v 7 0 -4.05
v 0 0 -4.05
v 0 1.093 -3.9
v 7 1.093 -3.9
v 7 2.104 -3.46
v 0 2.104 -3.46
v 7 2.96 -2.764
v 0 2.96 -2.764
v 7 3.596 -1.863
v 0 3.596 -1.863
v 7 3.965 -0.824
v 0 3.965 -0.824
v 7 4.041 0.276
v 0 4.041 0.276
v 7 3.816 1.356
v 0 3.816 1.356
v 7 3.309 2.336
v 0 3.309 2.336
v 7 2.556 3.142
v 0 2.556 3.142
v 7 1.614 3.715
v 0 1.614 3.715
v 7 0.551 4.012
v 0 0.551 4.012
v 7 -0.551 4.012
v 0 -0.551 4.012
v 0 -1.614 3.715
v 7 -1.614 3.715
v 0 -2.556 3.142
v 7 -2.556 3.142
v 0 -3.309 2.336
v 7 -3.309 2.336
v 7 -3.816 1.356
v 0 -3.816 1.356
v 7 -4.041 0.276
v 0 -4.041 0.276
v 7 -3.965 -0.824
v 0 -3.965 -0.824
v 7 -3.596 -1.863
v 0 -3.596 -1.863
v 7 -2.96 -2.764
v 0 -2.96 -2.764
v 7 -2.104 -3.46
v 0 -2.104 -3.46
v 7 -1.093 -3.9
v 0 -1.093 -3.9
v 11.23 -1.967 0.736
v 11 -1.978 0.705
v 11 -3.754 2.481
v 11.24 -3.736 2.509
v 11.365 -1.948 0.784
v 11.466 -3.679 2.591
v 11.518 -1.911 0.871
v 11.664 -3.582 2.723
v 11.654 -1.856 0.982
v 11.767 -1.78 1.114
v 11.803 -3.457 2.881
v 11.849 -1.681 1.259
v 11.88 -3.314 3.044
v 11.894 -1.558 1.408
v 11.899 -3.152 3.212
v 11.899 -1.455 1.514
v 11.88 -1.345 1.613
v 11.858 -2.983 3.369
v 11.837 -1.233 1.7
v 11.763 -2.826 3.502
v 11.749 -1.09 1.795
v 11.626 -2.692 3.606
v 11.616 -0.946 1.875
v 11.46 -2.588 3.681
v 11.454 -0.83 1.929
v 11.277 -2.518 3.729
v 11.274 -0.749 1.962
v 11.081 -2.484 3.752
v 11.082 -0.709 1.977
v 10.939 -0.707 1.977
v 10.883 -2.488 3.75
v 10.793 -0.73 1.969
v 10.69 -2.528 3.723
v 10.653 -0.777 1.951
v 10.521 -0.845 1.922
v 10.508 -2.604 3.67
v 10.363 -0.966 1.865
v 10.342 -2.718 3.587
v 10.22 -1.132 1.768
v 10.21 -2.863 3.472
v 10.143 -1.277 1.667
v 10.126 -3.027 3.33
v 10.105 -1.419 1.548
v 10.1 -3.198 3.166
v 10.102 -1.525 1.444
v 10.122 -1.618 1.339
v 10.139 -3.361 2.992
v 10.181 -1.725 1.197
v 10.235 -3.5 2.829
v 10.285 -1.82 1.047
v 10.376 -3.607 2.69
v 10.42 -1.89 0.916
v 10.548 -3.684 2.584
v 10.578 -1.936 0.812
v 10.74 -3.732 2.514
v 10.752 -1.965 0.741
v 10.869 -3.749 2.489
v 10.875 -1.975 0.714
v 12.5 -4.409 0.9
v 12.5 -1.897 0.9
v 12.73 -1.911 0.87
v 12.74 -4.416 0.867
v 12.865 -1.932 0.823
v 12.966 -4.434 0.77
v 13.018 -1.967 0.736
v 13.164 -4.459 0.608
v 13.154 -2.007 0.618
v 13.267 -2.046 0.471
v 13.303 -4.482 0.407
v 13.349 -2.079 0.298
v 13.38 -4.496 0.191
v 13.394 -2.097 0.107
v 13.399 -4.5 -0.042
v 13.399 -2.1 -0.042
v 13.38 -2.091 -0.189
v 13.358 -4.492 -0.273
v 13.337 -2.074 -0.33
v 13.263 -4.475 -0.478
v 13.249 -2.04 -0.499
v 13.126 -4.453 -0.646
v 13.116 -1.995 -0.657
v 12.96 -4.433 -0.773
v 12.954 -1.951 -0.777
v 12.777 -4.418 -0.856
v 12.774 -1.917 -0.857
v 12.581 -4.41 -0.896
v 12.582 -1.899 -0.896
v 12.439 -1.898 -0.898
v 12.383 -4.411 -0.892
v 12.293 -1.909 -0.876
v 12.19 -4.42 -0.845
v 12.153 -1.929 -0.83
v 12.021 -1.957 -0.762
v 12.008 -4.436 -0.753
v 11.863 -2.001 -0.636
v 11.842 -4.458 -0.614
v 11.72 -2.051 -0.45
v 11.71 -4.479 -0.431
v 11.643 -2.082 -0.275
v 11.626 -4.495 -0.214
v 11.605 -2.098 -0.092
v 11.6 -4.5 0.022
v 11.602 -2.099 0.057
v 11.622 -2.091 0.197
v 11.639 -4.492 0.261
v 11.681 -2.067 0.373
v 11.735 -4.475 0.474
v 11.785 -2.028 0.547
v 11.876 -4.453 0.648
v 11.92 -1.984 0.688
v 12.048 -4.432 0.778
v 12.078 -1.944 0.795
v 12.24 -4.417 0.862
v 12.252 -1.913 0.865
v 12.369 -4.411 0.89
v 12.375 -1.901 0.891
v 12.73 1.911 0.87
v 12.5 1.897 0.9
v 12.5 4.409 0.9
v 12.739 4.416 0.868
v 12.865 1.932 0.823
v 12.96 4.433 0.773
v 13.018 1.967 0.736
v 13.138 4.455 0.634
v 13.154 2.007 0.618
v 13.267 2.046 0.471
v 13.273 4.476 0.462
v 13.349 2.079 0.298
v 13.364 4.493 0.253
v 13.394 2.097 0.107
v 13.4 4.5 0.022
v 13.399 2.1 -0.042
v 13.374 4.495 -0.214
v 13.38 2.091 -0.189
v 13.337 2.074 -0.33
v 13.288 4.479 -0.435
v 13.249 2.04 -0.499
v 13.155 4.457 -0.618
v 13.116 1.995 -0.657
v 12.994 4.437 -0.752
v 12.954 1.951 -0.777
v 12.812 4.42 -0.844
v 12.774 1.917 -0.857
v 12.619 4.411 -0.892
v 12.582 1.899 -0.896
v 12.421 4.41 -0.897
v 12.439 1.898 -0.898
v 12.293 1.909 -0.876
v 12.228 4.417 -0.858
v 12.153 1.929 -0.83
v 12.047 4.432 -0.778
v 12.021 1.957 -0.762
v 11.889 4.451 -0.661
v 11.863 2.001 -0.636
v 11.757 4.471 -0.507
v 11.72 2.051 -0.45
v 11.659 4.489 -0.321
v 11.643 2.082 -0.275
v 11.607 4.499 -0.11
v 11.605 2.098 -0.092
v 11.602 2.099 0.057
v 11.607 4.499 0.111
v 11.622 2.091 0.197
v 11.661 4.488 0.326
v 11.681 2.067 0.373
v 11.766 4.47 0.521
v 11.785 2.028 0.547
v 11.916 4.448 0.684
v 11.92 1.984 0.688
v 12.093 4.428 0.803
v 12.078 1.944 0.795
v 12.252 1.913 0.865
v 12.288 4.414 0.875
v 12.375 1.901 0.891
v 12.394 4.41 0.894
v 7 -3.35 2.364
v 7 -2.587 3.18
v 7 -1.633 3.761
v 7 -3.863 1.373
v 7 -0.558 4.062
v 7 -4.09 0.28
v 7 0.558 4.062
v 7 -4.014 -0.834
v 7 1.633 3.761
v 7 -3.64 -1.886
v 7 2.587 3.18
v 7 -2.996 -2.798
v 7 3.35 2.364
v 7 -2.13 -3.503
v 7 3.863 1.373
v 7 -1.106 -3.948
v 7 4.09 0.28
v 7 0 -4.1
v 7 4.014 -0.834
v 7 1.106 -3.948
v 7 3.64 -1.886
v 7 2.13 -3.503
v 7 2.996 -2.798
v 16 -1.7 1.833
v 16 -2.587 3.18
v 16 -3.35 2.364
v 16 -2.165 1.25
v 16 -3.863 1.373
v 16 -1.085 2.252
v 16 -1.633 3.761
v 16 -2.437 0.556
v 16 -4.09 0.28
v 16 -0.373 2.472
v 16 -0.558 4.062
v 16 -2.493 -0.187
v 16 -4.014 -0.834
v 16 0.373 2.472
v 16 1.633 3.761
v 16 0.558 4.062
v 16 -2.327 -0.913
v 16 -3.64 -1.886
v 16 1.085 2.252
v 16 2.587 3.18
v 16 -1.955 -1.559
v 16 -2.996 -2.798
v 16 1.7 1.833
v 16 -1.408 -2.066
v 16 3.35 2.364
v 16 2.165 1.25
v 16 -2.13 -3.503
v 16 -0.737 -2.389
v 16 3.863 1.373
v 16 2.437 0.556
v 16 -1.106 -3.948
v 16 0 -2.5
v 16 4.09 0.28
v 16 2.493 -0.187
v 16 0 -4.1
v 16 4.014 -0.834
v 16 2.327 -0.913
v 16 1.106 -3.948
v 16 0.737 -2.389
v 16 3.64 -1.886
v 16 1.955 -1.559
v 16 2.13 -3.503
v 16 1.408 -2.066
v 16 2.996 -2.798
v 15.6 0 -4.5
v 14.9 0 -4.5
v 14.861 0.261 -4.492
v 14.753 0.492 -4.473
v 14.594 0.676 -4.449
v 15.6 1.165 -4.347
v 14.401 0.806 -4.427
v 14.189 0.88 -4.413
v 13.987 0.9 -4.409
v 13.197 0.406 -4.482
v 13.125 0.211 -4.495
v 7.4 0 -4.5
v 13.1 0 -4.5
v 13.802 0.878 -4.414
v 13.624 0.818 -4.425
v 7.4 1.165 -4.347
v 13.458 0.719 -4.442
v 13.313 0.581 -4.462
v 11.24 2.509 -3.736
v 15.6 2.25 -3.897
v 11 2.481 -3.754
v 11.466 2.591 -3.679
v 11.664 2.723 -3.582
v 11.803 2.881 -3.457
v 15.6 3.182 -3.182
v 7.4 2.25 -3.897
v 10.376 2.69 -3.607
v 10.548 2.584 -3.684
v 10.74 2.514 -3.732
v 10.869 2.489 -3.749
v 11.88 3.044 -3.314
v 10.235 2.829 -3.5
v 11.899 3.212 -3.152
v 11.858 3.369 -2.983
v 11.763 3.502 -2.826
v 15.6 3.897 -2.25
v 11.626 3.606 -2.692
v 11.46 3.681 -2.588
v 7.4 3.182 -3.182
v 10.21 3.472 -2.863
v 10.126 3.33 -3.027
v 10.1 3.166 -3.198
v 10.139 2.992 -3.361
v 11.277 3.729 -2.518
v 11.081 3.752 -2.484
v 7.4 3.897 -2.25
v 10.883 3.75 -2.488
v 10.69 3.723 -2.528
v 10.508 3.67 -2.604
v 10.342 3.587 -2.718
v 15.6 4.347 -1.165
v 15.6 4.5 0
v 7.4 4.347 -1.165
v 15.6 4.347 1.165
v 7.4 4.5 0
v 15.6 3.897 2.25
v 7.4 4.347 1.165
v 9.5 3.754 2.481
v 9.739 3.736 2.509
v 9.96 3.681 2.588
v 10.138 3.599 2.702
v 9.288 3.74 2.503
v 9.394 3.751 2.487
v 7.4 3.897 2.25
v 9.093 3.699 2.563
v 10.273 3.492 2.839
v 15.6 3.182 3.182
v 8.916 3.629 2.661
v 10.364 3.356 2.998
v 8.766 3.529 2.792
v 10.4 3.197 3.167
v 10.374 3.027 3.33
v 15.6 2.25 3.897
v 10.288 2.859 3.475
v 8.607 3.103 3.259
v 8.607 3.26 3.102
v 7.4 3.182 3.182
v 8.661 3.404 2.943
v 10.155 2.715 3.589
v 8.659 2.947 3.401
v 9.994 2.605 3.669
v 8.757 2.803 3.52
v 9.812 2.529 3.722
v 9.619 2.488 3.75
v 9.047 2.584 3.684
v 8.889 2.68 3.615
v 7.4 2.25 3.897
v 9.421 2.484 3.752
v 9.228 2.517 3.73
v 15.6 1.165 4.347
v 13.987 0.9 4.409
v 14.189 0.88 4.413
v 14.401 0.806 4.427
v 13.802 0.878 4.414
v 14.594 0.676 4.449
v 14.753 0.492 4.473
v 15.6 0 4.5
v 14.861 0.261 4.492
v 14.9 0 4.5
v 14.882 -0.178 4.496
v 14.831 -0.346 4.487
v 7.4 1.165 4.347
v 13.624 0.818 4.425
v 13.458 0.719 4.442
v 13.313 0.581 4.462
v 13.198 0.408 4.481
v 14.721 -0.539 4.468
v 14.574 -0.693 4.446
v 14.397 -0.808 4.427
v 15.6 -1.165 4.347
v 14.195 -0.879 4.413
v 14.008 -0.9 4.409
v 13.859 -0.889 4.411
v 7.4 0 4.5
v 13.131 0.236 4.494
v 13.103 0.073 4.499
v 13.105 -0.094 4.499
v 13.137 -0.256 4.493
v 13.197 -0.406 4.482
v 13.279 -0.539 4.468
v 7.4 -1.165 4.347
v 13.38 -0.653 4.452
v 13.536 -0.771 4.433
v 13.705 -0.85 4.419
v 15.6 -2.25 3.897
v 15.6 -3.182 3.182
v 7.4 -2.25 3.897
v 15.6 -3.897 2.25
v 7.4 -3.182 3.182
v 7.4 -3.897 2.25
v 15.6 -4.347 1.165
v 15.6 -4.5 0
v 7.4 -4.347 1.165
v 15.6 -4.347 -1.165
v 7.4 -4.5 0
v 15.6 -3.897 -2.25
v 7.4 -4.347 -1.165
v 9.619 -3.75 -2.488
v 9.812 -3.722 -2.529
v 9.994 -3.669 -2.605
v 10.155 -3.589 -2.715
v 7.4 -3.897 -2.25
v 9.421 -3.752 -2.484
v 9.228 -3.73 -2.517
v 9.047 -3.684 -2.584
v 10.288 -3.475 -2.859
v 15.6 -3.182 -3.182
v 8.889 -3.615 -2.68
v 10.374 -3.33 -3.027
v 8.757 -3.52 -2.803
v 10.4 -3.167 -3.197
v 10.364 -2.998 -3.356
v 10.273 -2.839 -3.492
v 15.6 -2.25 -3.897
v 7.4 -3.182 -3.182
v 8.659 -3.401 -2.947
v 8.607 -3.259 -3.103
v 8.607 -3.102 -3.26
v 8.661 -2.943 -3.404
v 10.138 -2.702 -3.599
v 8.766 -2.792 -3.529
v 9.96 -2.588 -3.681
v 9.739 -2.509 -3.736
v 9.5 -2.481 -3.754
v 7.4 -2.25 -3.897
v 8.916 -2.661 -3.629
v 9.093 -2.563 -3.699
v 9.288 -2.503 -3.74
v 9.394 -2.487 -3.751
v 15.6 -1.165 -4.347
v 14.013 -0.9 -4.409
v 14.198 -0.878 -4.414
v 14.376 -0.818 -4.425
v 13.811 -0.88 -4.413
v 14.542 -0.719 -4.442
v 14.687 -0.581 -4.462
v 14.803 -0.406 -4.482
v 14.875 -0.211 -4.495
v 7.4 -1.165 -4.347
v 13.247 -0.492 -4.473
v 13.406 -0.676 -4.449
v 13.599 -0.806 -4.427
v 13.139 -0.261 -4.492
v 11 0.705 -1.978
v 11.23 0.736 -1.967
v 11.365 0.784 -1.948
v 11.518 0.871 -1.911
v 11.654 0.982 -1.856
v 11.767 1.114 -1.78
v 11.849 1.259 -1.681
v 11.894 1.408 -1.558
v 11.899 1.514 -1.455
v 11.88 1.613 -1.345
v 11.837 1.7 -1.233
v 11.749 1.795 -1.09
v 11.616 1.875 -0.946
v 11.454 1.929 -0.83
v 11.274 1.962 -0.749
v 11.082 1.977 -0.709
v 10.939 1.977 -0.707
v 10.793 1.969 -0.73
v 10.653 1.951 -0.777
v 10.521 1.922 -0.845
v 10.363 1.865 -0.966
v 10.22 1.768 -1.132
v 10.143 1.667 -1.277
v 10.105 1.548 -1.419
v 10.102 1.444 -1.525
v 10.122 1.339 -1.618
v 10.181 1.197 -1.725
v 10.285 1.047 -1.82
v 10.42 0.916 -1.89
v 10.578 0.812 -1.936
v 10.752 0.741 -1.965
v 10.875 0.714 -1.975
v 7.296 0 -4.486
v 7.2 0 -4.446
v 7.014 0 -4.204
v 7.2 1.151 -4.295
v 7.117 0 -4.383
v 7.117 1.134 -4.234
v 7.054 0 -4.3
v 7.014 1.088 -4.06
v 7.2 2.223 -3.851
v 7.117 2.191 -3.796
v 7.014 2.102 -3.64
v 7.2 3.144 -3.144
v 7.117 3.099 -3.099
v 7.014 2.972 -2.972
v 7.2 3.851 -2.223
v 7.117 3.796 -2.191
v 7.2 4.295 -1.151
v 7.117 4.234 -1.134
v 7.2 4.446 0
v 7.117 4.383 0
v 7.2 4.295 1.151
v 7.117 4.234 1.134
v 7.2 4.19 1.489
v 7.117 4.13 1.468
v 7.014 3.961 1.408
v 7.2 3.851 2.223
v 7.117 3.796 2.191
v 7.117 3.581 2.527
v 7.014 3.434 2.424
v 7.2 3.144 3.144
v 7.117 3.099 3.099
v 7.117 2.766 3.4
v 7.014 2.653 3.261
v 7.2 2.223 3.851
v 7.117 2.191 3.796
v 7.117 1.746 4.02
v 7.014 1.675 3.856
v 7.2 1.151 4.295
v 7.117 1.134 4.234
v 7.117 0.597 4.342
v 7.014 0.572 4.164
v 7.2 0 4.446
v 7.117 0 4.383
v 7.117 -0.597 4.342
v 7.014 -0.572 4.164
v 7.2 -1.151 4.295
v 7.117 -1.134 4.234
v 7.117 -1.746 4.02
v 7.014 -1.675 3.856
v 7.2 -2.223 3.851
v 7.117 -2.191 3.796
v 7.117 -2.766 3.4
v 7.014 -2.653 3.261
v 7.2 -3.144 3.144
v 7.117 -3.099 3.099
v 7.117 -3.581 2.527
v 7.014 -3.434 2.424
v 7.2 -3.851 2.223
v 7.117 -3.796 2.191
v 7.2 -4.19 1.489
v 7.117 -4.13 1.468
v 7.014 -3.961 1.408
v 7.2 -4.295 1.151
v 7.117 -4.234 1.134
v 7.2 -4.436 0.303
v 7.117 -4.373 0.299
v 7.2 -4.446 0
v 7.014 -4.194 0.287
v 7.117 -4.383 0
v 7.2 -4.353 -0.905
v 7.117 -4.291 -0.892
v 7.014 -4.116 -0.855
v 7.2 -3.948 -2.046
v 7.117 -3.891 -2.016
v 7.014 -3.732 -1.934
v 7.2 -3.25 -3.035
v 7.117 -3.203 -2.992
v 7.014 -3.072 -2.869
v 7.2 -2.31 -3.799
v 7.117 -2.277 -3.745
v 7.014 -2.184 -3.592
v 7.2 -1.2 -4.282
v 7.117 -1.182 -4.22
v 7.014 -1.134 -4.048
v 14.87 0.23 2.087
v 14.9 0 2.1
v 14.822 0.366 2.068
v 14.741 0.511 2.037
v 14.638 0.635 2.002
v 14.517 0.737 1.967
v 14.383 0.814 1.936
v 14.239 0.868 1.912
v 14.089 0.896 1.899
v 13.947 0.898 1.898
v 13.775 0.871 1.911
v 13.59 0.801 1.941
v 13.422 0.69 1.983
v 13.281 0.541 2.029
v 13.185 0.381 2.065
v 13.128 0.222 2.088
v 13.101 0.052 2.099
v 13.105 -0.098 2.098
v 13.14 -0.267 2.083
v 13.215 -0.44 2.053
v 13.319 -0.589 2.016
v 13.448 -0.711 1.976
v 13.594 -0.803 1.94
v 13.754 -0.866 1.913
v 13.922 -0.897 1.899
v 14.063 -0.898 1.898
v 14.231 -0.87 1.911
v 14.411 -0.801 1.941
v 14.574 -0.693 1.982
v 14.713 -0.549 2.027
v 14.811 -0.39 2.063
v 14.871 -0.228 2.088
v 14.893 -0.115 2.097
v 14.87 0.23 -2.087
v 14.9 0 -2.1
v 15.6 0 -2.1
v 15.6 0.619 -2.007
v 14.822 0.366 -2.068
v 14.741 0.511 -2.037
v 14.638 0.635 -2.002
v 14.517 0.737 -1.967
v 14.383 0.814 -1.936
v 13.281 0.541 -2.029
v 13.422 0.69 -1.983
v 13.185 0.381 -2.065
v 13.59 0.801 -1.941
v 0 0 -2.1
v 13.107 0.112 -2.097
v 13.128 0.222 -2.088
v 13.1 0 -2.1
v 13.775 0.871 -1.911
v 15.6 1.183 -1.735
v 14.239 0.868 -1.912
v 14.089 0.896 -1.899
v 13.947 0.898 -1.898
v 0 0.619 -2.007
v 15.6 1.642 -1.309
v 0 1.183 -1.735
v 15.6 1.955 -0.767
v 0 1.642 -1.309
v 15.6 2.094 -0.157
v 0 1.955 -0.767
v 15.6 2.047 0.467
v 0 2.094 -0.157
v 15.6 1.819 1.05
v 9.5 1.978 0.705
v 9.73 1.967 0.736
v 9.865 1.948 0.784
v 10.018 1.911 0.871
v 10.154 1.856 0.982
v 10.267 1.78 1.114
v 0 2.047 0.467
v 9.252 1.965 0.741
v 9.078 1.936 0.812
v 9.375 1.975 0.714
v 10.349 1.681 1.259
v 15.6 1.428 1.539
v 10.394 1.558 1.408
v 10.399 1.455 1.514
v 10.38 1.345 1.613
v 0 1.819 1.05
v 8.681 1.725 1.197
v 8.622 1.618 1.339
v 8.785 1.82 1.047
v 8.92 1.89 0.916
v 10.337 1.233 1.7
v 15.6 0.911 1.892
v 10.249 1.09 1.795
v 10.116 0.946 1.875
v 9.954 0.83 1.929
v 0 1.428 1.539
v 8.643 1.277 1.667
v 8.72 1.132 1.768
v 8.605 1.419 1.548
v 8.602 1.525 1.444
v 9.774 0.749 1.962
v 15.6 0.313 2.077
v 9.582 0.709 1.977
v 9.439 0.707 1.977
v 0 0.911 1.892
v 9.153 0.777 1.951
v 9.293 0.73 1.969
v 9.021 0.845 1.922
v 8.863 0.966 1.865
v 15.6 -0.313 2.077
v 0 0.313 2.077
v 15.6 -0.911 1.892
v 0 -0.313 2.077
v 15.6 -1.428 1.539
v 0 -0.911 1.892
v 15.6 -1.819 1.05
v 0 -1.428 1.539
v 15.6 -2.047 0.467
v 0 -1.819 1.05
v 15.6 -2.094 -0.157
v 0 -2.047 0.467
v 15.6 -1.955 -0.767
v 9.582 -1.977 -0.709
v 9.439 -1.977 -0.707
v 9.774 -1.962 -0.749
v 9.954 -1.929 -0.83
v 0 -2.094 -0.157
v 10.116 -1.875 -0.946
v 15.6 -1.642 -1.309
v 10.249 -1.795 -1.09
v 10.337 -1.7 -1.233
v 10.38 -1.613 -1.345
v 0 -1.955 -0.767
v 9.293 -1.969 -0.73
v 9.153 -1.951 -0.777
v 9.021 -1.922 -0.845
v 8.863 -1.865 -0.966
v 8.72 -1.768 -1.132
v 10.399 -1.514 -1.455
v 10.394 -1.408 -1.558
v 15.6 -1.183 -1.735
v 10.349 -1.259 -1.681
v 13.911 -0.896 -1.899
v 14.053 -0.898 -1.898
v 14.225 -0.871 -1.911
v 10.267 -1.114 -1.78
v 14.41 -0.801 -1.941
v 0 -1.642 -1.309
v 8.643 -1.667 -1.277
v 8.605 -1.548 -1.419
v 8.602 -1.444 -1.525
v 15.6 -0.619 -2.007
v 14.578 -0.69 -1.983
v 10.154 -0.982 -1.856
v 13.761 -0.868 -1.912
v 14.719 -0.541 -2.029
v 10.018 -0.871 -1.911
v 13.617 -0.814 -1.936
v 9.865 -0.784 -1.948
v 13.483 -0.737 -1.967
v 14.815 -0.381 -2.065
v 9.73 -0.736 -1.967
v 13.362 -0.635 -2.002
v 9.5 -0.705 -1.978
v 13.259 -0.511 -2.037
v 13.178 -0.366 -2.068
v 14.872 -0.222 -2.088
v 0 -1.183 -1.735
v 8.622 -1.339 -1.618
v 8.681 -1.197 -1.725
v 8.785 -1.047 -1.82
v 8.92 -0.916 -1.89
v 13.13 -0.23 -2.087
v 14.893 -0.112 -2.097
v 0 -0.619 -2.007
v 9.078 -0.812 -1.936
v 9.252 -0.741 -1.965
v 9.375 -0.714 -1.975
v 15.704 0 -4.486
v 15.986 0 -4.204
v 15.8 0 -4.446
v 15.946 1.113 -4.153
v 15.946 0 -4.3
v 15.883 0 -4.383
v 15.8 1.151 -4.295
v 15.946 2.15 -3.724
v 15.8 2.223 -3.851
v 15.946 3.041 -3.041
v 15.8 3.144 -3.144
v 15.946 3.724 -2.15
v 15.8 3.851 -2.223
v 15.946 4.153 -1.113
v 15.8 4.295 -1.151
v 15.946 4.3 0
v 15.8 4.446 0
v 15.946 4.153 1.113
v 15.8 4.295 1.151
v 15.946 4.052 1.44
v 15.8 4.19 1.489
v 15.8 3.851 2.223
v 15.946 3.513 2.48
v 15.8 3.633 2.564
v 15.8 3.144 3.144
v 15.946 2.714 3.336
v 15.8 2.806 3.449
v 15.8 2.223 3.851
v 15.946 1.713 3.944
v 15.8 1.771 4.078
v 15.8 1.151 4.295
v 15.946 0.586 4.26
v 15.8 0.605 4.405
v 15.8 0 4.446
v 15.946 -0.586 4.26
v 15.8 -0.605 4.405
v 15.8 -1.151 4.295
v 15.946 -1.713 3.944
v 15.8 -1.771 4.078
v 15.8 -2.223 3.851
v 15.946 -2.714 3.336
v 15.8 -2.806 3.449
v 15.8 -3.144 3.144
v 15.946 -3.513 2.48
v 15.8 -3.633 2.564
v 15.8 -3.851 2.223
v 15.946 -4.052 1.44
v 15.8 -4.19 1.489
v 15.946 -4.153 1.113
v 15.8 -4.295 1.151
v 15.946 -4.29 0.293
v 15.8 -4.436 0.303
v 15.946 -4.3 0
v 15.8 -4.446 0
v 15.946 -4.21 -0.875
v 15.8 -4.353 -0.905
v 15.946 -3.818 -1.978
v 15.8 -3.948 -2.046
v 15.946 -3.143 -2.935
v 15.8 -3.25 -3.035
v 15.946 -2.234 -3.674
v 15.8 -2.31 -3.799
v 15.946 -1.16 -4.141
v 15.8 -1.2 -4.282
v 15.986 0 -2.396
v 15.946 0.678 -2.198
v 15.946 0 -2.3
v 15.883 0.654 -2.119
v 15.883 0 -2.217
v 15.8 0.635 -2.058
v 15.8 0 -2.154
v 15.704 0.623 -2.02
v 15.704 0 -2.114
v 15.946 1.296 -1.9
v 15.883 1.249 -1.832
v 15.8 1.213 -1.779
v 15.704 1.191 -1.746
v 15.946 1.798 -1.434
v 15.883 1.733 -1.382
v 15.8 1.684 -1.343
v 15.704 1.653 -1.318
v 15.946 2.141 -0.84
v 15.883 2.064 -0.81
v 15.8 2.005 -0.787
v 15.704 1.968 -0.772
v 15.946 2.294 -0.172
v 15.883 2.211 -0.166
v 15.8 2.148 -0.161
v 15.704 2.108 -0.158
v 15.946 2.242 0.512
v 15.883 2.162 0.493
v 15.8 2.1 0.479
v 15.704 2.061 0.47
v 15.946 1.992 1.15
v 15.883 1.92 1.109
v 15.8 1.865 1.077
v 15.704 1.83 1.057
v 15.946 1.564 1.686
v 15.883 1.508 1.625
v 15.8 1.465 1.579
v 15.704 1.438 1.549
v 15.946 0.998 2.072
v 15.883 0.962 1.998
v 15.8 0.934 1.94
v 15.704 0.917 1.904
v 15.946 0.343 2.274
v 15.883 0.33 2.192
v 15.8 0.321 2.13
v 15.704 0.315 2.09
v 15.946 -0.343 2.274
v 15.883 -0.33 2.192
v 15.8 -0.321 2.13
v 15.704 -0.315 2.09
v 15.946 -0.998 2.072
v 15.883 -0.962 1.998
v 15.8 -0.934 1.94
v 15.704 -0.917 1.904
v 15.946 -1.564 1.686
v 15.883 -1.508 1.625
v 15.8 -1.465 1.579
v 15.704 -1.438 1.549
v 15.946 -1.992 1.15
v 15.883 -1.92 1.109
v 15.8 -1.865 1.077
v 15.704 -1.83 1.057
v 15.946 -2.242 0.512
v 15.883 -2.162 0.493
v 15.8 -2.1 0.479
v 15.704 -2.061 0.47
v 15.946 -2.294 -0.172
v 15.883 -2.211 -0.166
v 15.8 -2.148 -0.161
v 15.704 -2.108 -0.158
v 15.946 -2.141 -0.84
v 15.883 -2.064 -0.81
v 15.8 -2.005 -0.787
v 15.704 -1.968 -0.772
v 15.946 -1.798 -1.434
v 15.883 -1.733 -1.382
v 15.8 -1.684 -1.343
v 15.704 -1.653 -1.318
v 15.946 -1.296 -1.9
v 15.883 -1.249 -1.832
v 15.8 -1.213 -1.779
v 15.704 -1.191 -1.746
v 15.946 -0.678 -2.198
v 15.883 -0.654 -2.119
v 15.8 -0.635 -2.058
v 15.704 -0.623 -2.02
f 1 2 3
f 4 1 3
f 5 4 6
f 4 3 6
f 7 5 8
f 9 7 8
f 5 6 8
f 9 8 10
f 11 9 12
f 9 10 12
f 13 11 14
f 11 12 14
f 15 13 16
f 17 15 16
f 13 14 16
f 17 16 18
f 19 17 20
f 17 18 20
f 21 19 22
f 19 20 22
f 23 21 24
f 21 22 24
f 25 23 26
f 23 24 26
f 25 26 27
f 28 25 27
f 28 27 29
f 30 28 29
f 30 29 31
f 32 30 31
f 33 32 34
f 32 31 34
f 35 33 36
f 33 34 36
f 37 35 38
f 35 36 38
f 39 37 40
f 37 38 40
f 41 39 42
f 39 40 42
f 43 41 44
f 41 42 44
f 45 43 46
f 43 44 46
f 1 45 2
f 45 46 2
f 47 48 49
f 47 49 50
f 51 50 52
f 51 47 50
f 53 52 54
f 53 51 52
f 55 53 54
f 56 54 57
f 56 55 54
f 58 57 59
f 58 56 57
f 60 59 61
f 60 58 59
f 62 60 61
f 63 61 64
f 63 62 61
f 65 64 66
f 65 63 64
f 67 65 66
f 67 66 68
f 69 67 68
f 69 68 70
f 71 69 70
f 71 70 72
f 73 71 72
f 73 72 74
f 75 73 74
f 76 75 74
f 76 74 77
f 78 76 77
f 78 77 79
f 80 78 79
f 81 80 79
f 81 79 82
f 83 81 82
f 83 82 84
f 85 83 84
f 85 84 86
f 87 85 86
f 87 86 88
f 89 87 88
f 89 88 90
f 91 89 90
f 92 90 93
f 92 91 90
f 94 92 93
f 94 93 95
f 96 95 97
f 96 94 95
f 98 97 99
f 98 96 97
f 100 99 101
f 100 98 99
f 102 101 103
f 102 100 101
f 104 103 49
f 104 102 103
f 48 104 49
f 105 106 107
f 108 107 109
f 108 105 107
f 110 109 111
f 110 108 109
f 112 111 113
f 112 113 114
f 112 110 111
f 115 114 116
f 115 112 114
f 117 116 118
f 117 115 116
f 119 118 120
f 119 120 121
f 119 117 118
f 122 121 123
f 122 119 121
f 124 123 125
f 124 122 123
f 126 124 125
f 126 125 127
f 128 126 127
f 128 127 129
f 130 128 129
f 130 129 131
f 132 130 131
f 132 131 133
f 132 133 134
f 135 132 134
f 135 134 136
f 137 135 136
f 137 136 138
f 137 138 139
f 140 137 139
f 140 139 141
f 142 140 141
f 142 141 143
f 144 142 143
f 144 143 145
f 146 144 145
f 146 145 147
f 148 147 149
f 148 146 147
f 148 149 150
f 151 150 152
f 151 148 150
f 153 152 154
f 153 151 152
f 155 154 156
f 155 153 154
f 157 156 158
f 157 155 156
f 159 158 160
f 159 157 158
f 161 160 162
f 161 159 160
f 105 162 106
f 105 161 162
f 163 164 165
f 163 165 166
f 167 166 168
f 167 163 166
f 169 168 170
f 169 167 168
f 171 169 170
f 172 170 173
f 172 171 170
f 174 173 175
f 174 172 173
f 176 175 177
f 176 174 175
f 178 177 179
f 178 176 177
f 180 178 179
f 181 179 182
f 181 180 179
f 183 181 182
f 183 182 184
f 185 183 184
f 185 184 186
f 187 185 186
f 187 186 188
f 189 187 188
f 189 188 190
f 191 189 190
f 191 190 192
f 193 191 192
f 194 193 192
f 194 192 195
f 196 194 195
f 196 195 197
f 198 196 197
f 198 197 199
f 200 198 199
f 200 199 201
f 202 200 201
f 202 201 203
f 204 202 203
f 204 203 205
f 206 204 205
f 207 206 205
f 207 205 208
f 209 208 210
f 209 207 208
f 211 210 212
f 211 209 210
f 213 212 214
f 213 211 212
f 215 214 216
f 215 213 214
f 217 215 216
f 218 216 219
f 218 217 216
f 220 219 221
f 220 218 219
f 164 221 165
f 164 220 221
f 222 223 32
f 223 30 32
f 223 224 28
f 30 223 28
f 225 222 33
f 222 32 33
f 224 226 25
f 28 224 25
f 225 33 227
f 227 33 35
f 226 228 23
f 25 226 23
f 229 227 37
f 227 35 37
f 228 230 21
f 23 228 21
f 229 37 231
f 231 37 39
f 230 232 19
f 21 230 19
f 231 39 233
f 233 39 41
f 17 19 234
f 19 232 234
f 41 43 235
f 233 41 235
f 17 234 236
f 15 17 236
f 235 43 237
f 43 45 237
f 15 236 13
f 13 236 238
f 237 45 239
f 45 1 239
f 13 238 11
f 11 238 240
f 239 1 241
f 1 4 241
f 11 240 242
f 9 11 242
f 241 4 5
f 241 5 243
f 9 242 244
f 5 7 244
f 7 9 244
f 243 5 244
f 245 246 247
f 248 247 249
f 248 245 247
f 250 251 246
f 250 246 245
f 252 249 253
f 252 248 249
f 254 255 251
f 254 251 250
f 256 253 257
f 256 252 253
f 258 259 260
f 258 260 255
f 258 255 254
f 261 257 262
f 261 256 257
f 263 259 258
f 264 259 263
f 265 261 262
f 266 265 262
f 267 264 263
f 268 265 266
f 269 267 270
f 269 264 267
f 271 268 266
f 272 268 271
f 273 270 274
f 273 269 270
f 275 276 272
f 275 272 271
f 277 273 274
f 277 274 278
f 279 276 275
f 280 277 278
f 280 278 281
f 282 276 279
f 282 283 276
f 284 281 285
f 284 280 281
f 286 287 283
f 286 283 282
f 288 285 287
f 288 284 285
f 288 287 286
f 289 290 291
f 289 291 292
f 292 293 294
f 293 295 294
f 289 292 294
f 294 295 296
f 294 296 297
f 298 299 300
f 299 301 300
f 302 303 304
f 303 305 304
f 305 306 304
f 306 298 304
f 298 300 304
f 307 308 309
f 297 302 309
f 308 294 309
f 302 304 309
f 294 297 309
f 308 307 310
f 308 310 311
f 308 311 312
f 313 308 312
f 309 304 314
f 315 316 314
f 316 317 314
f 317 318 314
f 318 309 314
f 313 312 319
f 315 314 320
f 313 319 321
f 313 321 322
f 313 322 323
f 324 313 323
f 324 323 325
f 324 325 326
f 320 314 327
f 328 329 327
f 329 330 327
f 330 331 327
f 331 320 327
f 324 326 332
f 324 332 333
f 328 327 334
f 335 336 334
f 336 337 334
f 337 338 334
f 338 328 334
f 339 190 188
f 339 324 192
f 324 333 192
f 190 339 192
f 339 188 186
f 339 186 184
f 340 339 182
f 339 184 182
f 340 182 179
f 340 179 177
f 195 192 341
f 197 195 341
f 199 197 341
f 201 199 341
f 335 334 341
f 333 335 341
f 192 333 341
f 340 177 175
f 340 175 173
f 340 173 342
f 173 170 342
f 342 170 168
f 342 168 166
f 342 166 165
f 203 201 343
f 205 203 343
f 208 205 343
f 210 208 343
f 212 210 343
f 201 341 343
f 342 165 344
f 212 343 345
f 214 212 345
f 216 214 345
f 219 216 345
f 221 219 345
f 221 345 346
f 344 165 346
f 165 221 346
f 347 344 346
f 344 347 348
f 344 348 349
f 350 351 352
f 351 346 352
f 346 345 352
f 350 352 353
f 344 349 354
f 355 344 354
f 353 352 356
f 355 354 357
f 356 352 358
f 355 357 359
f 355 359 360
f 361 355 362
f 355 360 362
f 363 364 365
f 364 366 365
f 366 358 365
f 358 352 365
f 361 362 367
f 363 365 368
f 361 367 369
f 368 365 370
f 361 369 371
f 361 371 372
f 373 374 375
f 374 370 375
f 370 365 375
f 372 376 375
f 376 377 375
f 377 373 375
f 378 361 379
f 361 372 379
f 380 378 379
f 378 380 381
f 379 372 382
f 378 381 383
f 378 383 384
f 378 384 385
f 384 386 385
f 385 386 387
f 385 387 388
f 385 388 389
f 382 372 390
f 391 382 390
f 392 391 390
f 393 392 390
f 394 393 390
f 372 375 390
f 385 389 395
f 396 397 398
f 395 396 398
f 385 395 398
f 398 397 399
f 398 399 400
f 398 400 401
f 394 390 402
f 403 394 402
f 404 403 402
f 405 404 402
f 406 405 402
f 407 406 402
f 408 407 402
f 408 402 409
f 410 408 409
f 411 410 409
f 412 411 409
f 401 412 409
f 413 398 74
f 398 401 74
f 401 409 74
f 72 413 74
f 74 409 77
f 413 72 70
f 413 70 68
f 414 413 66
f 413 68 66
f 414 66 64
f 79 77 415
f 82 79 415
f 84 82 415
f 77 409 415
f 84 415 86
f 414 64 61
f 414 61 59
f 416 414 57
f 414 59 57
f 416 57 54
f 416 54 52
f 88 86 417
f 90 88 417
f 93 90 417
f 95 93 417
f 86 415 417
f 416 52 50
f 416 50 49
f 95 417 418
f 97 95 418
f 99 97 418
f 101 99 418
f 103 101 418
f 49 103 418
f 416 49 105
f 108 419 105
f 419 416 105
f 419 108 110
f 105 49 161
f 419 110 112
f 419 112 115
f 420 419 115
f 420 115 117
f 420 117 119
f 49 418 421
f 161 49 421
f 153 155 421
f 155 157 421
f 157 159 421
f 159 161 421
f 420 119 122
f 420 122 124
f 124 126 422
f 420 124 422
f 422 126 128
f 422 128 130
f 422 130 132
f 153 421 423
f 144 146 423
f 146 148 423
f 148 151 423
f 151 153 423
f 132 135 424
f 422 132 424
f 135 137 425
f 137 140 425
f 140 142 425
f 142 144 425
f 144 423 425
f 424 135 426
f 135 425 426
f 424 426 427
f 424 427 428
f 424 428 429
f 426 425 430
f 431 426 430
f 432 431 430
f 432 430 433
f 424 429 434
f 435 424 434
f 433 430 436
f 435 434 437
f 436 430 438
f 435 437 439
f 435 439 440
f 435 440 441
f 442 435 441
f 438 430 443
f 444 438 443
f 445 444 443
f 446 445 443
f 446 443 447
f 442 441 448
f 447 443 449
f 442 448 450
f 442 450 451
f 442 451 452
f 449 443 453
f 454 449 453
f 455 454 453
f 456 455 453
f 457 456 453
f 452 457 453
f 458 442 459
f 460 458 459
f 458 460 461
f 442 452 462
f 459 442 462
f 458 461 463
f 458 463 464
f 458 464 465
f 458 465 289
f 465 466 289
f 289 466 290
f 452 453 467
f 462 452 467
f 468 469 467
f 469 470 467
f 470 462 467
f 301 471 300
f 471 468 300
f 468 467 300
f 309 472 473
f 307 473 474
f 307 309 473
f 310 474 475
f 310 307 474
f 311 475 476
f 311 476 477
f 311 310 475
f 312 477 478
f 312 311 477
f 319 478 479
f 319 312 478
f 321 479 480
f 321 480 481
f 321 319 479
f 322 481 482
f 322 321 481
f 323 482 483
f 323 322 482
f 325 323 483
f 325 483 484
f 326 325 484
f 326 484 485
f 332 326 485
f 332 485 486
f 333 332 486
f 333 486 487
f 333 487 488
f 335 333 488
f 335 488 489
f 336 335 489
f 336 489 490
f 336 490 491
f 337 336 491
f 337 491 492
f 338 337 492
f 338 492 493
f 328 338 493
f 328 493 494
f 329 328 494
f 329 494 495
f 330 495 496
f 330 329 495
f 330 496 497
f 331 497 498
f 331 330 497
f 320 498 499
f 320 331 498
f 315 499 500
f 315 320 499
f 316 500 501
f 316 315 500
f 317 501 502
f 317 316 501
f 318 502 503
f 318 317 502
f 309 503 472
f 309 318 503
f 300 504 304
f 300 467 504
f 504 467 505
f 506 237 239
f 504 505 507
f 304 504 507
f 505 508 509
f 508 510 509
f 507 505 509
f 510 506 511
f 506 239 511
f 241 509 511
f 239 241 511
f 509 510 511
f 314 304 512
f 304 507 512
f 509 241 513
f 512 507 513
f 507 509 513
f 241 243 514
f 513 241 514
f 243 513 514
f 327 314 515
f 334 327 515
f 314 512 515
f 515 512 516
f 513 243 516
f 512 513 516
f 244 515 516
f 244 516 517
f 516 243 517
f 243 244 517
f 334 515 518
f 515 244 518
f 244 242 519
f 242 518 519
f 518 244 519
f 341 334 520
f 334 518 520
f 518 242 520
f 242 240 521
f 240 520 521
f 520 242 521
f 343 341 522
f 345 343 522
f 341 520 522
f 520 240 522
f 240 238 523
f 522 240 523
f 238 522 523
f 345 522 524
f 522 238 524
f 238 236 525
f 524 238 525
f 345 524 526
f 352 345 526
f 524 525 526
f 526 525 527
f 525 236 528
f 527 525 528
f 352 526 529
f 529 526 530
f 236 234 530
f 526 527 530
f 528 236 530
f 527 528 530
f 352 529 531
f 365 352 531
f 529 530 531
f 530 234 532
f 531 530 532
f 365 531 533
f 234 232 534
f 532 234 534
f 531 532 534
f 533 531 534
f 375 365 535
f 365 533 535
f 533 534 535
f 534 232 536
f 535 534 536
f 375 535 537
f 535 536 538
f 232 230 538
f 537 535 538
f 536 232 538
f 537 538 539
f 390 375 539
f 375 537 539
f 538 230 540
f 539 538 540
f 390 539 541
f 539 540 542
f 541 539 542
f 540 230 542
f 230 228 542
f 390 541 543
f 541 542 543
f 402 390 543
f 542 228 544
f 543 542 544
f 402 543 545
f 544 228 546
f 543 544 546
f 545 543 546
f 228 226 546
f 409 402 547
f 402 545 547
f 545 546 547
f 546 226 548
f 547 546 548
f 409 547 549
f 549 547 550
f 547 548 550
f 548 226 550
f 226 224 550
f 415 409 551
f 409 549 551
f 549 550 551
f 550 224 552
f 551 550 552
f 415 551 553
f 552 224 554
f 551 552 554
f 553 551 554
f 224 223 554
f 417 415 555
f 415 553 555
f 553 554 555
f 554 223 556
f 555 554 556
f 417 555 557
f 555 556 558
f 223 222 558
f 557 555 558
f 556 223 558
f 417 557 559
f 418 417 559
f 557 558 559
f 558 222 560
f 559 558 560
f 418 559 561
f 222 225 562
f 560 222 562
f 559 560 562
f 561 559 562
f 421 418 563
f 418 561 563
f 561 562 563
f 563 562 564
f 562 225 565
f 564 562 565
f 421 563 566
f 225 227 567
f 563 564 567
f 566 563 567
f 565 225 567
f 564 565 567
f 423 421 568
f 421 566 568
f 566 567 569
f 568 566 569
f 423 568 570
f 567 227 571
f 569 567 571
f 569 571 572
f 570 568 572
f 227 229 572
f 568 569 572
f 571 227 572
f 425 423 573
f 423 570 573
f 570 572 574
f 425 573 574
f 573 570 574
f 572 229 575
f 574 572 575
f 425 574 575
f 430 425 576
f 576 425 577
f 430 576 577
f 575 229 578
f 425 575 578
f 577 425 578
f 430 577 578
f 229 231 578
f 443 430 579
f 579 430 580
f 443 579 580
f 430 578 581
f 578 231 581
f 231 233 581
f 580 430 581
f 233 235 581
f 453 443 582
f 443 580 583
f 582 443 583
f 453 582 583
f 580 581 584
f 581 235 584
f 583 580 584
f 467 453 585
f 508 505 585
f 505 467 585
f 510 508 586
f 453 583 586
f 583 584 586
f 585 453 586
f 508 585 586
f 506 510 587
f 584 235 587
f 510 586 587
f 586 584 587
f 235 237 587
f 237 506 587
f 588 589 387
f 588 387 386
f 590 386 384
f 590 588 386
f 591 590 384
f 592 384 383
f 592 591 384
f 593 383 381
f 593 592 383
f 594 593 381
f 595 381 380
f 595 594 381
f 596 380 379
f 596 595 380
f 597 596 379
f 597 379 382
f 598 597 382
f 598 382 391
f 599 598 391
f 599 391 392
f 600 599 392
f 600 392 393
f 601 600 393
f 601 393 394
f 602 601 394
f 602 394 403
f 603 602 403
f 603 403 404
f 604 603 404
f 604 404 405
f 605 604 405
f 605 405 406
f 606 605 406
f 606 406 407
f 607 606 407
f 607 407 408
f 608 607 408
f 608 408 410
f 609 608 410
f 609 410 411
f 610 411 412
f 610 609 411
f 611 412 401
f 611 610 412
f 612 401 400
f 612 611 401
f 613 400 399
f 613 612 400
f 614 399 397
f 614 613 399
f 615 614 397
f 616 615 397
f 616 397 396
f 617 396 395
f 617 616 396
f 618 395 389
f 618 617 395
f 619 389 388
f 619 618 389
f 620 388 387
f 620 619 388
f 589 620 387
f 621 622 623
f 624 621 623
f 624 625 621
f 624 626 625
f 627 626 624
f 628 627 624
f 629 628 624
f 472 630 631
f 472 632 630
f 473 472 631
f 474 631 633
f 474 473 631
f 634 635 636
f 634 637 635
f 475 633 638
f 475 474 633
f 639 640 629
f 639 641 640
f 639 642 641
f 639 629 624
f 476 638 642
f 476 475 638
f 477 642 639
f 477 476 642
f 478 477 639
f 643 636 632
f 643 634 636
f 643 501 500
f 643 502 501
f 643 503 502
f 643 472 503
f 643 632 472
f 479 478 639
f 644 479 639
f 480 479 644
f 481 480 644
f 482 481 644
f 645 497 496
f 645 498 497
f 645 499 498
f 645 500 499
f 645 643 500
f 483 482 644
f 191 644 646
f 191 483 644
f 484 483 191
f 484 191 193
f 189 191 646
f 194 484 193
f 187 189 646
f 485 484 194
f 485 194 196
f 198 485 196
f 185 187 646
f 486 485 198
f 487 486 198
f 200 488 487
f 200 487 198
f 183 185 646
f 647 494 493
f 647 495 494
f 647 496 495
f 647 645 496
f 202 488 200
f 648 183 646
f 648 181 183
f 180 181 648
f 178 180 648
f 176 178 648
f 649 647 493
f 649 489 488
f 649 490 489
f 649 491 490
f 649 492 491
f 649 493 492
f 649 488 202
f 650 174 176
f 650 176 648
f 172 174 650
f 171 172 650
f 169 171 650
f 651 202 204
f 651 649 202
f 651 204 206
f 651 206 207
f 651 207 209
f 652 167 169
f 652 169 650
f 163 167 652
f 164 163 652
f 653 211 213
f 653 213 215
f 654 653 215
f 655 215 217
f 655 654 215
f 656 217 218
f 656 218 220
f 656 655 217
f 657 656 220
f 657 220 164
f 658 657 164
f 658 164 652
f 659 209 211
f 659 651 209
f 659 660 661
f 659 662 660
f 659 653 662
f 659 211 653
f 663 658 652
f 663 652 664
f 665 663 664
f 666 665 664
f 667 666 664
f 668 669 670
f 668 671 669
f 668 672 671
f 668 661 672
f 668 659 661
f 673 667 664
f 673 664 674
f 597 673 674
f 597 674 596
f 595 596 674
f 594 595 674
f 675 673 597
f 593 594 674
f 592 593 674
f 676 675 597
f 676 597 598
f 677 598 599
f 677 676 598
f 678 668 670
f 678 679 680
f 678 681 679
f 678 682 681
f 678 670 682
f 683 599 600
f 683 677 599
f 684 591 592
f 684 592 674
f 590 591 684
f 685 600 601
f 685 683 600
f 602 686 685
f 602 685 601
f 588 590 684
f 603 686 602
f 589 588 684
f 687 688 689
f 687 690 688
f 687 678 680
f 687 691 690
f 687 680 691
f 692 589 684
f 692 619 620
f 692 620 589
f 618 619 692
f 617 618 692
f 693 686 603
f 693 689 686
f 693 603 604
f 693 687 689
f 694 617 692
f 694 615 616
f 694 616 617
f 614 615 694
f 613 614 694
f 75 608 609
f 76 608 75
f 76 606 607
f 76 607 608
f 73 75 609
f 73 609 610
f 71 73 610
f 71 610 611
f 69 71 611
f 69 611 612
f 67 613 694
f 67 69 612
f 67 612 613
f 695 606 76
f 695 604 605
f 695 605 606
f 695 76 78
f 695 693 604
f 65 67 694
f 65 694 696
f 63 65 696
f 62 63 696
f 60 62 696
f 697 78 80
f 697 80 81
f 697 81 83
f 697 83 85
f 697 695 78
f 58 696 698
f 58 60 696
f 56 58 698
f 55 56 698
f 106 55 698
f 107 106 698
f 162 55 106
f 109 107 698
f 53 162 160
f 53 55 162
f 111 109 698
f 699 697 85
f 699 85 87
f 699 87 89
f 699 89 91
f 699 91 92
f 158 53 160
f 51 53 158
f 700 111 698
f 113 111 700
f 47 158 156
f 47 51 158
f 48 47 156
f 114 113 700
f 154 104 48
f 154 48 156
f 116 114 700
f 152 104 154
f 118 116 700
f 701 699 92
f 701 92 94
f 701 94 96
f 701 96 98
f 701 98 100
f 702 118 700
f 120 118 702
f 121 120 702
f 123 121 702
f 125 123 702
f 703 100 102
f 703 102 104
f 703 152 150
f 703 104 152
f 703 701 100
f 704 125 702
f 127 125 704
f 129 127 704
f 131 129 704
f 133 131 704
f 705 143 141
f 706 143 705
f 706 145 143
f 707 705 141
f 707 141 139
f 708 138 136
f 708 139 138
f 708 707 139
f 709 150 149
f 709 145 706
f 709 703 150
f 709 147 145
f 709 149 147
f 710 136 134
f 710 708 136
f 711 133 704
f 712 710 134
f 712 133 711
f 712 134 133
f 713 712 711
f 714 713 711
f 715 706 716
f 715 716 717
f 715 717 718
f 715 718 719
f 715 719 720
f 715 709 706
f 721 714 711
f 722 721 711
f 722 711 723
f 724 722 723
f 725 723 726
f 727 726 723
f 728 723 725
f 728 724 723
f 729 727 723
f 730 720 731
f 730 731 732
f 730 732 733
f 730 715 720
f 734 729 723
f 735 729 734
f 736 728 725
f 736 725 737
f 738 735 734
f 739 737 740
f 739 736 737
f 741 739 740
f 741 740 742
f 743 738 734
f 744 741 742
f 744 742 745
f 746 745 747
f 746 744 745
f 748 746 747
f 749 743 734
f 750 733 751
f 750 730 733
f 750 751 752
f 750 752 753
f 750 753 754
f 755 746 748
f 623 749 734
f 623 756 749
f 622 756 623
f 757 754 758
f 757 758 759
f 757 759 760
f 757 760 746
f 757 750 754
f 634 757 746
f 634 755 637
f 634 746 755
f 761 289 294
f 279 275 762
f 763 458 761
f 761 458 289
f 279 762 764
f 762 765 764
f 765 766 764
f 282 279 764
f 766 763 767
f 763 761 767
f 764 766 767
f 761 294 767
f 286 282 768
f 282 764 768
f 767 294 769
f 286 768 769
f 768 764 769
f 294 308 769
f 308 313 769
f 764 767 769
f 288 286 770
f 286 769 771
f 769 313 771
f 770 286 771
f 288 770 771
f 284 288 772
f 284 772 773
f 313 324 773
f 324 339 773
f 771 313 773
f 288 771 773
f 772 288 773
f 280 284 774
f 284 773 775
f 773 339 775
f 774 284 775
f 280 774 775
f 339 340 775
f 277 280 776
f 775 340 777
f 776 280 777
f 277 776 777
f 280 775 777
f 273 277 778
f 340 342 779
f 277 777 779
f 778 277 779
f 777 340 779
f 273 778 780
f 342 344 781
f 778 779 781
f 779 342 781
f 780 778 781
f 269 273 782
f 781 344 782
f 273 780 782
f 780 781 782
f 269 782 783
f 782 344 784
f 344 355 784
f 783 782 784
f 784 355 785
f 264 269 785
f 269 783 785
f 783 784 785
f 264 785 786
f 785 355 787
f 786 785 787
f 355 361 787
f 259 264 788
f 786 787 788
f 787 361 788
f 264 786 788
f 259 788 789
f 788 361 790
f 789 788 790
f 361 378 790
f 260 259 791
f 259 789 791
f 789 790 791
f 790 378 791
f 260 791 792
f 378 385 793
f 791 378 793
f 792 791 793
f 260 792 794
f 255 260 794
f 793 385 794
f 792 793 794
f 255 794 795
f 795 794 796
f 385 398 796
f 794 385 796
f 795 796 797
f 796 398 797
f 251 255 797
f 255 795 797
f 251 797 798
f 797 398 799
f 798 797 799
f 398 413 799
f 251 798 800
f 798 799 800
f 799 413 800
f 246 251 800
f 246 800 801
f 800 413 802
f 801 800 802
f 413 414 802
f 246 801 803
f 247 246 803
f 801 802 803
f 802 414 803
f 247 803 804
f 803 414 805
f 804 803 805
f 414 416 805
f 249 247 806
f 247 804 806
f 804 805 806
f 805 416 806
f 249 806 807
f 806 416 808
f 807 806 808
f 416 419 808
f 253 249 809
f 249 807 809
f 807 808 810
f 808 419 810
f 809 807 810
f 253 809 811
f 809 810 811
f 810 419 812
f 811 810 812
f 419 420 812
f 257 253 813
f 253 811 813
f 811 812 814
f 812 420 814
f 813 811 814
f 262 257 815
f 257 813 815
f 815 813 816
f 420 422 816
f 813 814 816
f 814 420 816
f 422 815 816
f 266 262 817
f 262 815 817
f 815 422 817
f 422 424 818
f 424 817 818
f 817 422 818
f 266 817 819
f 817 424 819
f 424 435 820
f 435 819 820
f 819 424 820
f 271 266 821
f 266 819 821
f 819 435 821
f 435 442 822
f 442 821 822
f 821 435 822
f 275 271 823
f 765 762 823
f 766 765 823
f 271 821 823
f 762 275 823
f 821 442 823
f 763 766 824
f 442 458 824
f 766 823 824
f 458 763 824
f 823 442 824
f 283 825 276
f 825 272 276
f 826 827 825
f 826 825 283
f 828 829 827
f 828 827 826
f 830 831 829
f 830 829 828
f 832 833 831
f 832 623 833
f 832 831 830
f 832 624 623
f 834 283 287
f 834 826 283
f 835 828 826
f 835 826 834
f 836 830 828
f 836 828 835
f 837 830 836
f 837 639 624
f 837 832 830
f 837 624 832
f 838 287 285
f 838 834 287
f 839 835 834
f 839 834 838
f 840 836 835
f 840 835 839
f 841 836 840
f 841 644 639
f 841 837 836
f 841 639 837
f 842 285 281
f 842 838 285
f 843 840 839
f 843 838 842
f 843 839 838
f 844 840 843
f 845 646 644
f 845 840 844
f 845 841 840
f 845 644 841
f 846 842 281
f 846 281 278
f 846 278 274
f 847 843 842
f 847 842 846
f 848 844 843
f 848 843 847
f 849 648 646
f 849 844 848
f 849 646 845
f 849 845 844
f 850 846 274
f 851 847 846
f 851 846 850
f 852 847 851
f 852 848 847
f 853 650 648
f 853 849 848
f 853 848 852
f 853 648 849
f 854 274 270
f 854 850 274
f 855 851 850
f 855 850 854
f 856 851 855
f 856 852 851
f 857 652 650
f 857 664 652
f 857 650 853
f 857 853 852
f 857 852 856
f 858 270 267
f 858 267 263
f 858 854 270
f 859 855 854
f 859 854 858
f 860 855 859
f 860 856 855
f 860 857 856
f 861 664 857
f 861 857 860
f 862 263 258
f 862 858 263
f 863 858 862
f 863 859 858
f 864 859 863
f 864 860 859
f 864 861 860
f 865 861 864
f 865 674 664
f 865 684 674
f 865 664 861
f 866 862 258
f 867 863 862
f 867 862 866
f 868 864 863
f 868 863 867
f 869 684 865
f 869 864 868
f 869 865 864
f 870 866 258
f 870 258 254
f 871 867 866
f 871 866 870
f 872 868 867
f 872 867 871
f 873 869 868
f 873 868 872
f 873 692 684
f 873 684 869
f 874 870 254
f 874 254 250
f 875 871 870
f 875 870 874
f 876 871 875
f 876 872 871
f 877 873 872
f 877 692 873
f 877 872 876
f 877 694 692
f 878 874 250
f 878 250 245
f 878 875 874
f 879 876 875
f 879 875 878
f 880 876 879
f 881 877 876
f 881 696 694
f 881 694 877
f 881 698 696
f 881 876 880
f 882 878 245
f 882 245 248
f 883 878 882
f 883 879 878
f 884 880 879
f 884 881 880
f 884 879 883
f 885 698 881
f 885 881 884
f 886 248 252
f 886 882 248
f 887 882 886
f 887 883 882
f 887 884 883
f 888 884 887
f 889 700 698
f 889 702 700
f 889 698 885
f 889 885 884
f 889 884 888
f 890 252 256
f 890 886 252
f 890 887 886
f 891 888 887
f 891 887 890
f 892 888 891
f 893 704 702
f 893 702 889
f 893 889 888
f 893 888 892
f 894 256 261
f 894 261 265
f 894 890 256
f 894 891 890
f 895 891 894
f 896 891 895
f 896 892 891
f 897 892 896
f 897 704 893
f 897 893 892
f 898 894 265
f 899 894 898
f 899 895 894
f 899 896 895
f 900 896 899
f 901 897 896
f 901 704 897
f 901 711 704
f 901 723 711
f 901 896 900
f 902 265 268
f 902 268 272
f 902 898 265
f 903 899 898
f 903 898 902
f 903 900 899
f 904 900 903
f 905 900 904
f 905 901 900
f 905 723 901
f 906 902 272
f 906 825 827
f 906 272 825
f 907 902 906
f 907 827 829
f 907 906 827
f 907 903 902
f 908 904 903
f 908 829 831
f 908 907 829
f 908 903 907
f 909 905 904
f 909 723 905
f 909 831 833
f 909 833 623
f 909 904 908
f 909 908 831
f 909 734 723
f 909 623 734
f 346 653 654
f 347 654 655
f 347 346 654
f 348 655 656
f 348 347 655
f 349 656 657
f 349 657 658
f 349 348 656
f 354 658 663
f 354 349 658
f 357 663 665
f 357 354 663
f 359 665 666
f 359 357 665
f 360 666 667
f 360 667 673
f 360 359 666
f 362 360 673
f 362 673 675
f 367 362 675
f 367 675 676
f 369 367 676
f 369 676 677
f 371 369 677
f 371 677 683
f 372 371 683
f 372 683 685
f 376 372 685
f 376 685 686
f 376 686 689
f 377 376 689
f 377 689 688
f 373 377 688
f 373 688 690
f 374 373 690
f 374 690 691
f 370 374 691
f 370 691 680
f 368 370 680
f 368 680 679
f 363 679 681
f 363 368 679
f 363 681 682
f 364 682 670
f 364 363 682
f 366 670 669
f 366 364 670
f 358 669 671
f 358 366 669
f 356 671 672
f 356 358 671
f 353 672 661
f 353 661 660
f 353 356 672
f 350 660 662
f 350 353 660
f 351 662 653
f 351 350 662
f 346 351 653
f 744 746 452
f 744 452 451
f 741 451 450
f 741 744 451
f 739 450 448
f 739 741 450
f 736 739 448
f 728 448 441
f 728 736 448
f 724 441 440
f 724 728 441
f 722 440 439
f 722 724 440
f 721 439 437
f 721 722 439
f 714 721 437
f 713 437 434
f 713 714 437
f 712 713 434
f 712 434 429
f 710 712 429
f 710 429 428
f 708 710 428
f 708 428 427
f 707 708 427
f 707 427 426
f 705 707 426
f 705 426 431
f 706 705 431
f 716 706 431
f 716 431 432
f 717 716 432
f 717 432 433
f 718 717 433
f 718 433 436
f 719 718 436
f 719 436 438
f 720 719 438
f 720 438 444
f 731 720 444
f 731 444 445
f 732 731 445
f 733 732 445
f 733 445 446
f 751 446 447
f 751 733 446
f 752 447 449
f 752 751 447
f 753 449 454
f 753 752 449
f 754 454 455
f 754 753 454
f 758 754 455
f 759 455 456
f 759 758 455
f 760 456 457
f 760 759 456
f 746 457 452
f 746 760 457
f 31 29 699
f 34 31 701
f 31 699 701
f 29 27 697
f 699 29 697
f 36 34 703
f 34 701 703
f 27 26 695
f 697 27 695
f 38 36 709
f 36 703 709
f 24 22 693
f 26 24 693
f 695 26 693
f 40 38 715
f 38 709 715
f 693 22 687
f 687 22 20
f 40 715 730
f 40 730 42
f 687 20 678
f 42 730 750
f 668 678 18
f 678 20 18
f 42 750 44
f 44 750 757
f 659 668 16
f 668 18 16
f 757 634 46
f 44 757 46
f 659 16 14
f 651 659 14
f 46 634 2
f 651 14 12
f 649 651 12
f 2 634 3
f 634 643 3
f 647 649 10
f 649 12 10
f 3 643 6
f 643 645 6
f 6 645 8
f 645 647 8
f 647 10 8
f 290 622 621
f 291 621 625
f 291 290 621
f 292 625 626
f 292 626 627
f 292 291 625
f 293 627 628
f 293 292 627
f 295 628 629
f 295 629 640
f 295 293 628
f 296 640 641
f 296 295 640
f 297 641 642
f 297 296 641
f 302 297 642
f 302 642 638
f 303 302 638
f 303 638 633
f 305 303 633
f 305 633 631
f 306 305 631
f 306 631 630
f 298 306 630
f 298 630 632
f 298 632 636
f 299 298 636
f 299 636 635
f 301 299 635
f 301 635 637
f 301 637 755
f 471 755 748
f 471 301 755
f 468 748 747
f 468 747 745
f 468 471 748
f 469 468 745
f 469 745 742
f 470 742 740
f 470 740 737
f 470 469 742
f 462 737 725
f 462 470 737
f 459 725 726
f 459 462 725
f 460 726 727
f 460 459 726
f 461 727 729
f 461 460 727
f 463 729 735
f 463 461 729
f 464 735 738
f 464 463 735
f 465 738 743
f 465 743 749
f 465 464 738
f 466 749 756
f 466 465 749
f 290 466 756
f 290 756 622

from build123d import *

# Parameters (mm, degrees)
SKETCH1_R               = 4.05
SKETCH1_R_2             = 2.1
BOSS_EXTRUDE1_DEPTH     = 7
SKETCH2_R               = 4.5
SKETCH2_R_2             = 2.1
BOSS_EXTRUDE2_DEPTH     = 9
FILLET1_R               = 0.4
CUT_EXTRUDE1_DEPTH      = 18.219175358
CUT_EXTRUDE1_DEPTH_BACK = 18.219175358
SKETCH3_R               = 0.9
CUT_EXTRUDE2_DEPTH      = 18.219175503
CUT_EXTRUDE2_DEPTH_BACK = 18.219175503
SKETCH4_R               = 0.9
CUT_EXTRUDE3_DEPTH      = 19.631291042
CUT_EXTRUDE3_DEPTH_BACK = 19.631291042
SKETCH6_R               = 0.9
CUT_EXTRUDE4_DEPTH      = 19.631291042
CUT_EXTRUDE4_DEPTH_BACK = 19.631291042
SKETCH7_R               = 0.9
FILLET2_R               = 0.4
FILLET3_R               = 0.4


with BuildPart() as part:
    # Sketch1 → Boss-Extrude1 (new body)
    with BuildSketch(Plane(origin=(0, 0, 0), x_dir=(0, 0, -1), z_dir=(1, 0, 0))):
        Circle(SKETCH1_R)
        Circle(SKETCH1_R_2, mode=Mode.SUBTRACT)
    extrude(amount=BOSS_EXTRUDE1_DEPTH)

    # Sketch2 → Boss-Extrude2 (add)
    with BuildSketch(Plane(origin=(7, 0, 0), x_dir=(0, 0, -1), z_dir=(1, 0, 0))):
        Circle(SKETCH2_R)
        Circle(SKETCH2_R_2, mode=Mode.SUBTRACT)
    extrude(amount=BOSS_EXTRUDE2_DEPTH)

    # Fillet1
    fillet1_edges = [part.edges().sort_by_distance(p)[0] for p in [
        (16, 0, 2.1),
    ]]
    fillet(fillet1_edges, radius=FILLET1_R)

    # Sketch3 → Cut-Extrude1 (cut, two sides: drawn at the far end of the back side and taken through both)
    with BuildSketch(Plane(origin=(0, 0, 0), x_dir=(1, 0, 0), z_dir=(0, 1, 0)).offset(-CUT_EXTRUDE1_DEPTH_BACK)):
        with Locations((12.5, 0)):
            Circle(SKETCH3_R)
    extrude(amount=CUT_EXTRUDE1_DEPTH + CUT_EXTRUDE1_DEPTH_BACK, mode=Mode.SUBTRACT)

    # Sketch4 → Cut-Extrude2 (cut, two sides: drawn at the far end of the back side and taken through both)
    with BuildSketch(Plane.XY.offset(-CUT_EXTRUDE2_DEPTH_BACK)):
        with Locations((14, 0)):
            Circle(SKETCH4_R)
    extrude(amount=CUT_EXTRUDE2_DEPTH + CUT_EXTRUDE2_DEPTH_BACK, mode=Mode.SUBTRACT)

    # Sketch6 → Cut-Extrude3 (cut, two sides: drawn at the far end of the back side and taken through both)
    with BuildSketch(Plane(origin=(0, 2.25, -2.25), x_dir=(1, 0, 0), z_dir=(0, -0.7071067811865488, 0.7071067811865464)).offset(-CUT_EXTRUDE3_DEPTH_BACK)):
        with Locations((11, 0)):
            Circle(SKETCH6_R)
    extrude(amount=CUT_EXTRUDE3_DEPTH + CUT_EXTRUDE3_DEPTH_BACK, mode=Mode.SUBTRACT)

    # Sketch7 → Cut-Extrude4 (cut, two sides: drawn at the far end of the back side and taken through both)
    with BuildSketch(Plane(origin=(0, -2.25, -2.25), x_dir=(1, 0, 0), z_dir=(0, -0.7071067811865438, -0.7071067811865512)).offset(-CUT_EXTRUDE4_DEPTH_BACK)):
        with Locations((9.5, 0)):
            Circle(SKETCH7_R)
    extrude(amount=CUT_EXTRUDE4_DEPTH + CUT_EXTRUDE4_DEPTH_BACK, mode=Mode.SUBTRACT)

    # Fillet2
    fillet2_edges = [part.edges().sort_by_distance(p)[0] for p in [
        (16, 0, 4.5),
    ]]
    fillet(fillet2_edges, radius=FILLET2_R)

    # Fillet3
    fillet3_edges = [part.edges().sort_by_distance(p)[0] for p in [
        (7, 0, 4.5),
    ]]
    fillet(fillet3_edges, radius=FILLET3_R)


solid = part.part
